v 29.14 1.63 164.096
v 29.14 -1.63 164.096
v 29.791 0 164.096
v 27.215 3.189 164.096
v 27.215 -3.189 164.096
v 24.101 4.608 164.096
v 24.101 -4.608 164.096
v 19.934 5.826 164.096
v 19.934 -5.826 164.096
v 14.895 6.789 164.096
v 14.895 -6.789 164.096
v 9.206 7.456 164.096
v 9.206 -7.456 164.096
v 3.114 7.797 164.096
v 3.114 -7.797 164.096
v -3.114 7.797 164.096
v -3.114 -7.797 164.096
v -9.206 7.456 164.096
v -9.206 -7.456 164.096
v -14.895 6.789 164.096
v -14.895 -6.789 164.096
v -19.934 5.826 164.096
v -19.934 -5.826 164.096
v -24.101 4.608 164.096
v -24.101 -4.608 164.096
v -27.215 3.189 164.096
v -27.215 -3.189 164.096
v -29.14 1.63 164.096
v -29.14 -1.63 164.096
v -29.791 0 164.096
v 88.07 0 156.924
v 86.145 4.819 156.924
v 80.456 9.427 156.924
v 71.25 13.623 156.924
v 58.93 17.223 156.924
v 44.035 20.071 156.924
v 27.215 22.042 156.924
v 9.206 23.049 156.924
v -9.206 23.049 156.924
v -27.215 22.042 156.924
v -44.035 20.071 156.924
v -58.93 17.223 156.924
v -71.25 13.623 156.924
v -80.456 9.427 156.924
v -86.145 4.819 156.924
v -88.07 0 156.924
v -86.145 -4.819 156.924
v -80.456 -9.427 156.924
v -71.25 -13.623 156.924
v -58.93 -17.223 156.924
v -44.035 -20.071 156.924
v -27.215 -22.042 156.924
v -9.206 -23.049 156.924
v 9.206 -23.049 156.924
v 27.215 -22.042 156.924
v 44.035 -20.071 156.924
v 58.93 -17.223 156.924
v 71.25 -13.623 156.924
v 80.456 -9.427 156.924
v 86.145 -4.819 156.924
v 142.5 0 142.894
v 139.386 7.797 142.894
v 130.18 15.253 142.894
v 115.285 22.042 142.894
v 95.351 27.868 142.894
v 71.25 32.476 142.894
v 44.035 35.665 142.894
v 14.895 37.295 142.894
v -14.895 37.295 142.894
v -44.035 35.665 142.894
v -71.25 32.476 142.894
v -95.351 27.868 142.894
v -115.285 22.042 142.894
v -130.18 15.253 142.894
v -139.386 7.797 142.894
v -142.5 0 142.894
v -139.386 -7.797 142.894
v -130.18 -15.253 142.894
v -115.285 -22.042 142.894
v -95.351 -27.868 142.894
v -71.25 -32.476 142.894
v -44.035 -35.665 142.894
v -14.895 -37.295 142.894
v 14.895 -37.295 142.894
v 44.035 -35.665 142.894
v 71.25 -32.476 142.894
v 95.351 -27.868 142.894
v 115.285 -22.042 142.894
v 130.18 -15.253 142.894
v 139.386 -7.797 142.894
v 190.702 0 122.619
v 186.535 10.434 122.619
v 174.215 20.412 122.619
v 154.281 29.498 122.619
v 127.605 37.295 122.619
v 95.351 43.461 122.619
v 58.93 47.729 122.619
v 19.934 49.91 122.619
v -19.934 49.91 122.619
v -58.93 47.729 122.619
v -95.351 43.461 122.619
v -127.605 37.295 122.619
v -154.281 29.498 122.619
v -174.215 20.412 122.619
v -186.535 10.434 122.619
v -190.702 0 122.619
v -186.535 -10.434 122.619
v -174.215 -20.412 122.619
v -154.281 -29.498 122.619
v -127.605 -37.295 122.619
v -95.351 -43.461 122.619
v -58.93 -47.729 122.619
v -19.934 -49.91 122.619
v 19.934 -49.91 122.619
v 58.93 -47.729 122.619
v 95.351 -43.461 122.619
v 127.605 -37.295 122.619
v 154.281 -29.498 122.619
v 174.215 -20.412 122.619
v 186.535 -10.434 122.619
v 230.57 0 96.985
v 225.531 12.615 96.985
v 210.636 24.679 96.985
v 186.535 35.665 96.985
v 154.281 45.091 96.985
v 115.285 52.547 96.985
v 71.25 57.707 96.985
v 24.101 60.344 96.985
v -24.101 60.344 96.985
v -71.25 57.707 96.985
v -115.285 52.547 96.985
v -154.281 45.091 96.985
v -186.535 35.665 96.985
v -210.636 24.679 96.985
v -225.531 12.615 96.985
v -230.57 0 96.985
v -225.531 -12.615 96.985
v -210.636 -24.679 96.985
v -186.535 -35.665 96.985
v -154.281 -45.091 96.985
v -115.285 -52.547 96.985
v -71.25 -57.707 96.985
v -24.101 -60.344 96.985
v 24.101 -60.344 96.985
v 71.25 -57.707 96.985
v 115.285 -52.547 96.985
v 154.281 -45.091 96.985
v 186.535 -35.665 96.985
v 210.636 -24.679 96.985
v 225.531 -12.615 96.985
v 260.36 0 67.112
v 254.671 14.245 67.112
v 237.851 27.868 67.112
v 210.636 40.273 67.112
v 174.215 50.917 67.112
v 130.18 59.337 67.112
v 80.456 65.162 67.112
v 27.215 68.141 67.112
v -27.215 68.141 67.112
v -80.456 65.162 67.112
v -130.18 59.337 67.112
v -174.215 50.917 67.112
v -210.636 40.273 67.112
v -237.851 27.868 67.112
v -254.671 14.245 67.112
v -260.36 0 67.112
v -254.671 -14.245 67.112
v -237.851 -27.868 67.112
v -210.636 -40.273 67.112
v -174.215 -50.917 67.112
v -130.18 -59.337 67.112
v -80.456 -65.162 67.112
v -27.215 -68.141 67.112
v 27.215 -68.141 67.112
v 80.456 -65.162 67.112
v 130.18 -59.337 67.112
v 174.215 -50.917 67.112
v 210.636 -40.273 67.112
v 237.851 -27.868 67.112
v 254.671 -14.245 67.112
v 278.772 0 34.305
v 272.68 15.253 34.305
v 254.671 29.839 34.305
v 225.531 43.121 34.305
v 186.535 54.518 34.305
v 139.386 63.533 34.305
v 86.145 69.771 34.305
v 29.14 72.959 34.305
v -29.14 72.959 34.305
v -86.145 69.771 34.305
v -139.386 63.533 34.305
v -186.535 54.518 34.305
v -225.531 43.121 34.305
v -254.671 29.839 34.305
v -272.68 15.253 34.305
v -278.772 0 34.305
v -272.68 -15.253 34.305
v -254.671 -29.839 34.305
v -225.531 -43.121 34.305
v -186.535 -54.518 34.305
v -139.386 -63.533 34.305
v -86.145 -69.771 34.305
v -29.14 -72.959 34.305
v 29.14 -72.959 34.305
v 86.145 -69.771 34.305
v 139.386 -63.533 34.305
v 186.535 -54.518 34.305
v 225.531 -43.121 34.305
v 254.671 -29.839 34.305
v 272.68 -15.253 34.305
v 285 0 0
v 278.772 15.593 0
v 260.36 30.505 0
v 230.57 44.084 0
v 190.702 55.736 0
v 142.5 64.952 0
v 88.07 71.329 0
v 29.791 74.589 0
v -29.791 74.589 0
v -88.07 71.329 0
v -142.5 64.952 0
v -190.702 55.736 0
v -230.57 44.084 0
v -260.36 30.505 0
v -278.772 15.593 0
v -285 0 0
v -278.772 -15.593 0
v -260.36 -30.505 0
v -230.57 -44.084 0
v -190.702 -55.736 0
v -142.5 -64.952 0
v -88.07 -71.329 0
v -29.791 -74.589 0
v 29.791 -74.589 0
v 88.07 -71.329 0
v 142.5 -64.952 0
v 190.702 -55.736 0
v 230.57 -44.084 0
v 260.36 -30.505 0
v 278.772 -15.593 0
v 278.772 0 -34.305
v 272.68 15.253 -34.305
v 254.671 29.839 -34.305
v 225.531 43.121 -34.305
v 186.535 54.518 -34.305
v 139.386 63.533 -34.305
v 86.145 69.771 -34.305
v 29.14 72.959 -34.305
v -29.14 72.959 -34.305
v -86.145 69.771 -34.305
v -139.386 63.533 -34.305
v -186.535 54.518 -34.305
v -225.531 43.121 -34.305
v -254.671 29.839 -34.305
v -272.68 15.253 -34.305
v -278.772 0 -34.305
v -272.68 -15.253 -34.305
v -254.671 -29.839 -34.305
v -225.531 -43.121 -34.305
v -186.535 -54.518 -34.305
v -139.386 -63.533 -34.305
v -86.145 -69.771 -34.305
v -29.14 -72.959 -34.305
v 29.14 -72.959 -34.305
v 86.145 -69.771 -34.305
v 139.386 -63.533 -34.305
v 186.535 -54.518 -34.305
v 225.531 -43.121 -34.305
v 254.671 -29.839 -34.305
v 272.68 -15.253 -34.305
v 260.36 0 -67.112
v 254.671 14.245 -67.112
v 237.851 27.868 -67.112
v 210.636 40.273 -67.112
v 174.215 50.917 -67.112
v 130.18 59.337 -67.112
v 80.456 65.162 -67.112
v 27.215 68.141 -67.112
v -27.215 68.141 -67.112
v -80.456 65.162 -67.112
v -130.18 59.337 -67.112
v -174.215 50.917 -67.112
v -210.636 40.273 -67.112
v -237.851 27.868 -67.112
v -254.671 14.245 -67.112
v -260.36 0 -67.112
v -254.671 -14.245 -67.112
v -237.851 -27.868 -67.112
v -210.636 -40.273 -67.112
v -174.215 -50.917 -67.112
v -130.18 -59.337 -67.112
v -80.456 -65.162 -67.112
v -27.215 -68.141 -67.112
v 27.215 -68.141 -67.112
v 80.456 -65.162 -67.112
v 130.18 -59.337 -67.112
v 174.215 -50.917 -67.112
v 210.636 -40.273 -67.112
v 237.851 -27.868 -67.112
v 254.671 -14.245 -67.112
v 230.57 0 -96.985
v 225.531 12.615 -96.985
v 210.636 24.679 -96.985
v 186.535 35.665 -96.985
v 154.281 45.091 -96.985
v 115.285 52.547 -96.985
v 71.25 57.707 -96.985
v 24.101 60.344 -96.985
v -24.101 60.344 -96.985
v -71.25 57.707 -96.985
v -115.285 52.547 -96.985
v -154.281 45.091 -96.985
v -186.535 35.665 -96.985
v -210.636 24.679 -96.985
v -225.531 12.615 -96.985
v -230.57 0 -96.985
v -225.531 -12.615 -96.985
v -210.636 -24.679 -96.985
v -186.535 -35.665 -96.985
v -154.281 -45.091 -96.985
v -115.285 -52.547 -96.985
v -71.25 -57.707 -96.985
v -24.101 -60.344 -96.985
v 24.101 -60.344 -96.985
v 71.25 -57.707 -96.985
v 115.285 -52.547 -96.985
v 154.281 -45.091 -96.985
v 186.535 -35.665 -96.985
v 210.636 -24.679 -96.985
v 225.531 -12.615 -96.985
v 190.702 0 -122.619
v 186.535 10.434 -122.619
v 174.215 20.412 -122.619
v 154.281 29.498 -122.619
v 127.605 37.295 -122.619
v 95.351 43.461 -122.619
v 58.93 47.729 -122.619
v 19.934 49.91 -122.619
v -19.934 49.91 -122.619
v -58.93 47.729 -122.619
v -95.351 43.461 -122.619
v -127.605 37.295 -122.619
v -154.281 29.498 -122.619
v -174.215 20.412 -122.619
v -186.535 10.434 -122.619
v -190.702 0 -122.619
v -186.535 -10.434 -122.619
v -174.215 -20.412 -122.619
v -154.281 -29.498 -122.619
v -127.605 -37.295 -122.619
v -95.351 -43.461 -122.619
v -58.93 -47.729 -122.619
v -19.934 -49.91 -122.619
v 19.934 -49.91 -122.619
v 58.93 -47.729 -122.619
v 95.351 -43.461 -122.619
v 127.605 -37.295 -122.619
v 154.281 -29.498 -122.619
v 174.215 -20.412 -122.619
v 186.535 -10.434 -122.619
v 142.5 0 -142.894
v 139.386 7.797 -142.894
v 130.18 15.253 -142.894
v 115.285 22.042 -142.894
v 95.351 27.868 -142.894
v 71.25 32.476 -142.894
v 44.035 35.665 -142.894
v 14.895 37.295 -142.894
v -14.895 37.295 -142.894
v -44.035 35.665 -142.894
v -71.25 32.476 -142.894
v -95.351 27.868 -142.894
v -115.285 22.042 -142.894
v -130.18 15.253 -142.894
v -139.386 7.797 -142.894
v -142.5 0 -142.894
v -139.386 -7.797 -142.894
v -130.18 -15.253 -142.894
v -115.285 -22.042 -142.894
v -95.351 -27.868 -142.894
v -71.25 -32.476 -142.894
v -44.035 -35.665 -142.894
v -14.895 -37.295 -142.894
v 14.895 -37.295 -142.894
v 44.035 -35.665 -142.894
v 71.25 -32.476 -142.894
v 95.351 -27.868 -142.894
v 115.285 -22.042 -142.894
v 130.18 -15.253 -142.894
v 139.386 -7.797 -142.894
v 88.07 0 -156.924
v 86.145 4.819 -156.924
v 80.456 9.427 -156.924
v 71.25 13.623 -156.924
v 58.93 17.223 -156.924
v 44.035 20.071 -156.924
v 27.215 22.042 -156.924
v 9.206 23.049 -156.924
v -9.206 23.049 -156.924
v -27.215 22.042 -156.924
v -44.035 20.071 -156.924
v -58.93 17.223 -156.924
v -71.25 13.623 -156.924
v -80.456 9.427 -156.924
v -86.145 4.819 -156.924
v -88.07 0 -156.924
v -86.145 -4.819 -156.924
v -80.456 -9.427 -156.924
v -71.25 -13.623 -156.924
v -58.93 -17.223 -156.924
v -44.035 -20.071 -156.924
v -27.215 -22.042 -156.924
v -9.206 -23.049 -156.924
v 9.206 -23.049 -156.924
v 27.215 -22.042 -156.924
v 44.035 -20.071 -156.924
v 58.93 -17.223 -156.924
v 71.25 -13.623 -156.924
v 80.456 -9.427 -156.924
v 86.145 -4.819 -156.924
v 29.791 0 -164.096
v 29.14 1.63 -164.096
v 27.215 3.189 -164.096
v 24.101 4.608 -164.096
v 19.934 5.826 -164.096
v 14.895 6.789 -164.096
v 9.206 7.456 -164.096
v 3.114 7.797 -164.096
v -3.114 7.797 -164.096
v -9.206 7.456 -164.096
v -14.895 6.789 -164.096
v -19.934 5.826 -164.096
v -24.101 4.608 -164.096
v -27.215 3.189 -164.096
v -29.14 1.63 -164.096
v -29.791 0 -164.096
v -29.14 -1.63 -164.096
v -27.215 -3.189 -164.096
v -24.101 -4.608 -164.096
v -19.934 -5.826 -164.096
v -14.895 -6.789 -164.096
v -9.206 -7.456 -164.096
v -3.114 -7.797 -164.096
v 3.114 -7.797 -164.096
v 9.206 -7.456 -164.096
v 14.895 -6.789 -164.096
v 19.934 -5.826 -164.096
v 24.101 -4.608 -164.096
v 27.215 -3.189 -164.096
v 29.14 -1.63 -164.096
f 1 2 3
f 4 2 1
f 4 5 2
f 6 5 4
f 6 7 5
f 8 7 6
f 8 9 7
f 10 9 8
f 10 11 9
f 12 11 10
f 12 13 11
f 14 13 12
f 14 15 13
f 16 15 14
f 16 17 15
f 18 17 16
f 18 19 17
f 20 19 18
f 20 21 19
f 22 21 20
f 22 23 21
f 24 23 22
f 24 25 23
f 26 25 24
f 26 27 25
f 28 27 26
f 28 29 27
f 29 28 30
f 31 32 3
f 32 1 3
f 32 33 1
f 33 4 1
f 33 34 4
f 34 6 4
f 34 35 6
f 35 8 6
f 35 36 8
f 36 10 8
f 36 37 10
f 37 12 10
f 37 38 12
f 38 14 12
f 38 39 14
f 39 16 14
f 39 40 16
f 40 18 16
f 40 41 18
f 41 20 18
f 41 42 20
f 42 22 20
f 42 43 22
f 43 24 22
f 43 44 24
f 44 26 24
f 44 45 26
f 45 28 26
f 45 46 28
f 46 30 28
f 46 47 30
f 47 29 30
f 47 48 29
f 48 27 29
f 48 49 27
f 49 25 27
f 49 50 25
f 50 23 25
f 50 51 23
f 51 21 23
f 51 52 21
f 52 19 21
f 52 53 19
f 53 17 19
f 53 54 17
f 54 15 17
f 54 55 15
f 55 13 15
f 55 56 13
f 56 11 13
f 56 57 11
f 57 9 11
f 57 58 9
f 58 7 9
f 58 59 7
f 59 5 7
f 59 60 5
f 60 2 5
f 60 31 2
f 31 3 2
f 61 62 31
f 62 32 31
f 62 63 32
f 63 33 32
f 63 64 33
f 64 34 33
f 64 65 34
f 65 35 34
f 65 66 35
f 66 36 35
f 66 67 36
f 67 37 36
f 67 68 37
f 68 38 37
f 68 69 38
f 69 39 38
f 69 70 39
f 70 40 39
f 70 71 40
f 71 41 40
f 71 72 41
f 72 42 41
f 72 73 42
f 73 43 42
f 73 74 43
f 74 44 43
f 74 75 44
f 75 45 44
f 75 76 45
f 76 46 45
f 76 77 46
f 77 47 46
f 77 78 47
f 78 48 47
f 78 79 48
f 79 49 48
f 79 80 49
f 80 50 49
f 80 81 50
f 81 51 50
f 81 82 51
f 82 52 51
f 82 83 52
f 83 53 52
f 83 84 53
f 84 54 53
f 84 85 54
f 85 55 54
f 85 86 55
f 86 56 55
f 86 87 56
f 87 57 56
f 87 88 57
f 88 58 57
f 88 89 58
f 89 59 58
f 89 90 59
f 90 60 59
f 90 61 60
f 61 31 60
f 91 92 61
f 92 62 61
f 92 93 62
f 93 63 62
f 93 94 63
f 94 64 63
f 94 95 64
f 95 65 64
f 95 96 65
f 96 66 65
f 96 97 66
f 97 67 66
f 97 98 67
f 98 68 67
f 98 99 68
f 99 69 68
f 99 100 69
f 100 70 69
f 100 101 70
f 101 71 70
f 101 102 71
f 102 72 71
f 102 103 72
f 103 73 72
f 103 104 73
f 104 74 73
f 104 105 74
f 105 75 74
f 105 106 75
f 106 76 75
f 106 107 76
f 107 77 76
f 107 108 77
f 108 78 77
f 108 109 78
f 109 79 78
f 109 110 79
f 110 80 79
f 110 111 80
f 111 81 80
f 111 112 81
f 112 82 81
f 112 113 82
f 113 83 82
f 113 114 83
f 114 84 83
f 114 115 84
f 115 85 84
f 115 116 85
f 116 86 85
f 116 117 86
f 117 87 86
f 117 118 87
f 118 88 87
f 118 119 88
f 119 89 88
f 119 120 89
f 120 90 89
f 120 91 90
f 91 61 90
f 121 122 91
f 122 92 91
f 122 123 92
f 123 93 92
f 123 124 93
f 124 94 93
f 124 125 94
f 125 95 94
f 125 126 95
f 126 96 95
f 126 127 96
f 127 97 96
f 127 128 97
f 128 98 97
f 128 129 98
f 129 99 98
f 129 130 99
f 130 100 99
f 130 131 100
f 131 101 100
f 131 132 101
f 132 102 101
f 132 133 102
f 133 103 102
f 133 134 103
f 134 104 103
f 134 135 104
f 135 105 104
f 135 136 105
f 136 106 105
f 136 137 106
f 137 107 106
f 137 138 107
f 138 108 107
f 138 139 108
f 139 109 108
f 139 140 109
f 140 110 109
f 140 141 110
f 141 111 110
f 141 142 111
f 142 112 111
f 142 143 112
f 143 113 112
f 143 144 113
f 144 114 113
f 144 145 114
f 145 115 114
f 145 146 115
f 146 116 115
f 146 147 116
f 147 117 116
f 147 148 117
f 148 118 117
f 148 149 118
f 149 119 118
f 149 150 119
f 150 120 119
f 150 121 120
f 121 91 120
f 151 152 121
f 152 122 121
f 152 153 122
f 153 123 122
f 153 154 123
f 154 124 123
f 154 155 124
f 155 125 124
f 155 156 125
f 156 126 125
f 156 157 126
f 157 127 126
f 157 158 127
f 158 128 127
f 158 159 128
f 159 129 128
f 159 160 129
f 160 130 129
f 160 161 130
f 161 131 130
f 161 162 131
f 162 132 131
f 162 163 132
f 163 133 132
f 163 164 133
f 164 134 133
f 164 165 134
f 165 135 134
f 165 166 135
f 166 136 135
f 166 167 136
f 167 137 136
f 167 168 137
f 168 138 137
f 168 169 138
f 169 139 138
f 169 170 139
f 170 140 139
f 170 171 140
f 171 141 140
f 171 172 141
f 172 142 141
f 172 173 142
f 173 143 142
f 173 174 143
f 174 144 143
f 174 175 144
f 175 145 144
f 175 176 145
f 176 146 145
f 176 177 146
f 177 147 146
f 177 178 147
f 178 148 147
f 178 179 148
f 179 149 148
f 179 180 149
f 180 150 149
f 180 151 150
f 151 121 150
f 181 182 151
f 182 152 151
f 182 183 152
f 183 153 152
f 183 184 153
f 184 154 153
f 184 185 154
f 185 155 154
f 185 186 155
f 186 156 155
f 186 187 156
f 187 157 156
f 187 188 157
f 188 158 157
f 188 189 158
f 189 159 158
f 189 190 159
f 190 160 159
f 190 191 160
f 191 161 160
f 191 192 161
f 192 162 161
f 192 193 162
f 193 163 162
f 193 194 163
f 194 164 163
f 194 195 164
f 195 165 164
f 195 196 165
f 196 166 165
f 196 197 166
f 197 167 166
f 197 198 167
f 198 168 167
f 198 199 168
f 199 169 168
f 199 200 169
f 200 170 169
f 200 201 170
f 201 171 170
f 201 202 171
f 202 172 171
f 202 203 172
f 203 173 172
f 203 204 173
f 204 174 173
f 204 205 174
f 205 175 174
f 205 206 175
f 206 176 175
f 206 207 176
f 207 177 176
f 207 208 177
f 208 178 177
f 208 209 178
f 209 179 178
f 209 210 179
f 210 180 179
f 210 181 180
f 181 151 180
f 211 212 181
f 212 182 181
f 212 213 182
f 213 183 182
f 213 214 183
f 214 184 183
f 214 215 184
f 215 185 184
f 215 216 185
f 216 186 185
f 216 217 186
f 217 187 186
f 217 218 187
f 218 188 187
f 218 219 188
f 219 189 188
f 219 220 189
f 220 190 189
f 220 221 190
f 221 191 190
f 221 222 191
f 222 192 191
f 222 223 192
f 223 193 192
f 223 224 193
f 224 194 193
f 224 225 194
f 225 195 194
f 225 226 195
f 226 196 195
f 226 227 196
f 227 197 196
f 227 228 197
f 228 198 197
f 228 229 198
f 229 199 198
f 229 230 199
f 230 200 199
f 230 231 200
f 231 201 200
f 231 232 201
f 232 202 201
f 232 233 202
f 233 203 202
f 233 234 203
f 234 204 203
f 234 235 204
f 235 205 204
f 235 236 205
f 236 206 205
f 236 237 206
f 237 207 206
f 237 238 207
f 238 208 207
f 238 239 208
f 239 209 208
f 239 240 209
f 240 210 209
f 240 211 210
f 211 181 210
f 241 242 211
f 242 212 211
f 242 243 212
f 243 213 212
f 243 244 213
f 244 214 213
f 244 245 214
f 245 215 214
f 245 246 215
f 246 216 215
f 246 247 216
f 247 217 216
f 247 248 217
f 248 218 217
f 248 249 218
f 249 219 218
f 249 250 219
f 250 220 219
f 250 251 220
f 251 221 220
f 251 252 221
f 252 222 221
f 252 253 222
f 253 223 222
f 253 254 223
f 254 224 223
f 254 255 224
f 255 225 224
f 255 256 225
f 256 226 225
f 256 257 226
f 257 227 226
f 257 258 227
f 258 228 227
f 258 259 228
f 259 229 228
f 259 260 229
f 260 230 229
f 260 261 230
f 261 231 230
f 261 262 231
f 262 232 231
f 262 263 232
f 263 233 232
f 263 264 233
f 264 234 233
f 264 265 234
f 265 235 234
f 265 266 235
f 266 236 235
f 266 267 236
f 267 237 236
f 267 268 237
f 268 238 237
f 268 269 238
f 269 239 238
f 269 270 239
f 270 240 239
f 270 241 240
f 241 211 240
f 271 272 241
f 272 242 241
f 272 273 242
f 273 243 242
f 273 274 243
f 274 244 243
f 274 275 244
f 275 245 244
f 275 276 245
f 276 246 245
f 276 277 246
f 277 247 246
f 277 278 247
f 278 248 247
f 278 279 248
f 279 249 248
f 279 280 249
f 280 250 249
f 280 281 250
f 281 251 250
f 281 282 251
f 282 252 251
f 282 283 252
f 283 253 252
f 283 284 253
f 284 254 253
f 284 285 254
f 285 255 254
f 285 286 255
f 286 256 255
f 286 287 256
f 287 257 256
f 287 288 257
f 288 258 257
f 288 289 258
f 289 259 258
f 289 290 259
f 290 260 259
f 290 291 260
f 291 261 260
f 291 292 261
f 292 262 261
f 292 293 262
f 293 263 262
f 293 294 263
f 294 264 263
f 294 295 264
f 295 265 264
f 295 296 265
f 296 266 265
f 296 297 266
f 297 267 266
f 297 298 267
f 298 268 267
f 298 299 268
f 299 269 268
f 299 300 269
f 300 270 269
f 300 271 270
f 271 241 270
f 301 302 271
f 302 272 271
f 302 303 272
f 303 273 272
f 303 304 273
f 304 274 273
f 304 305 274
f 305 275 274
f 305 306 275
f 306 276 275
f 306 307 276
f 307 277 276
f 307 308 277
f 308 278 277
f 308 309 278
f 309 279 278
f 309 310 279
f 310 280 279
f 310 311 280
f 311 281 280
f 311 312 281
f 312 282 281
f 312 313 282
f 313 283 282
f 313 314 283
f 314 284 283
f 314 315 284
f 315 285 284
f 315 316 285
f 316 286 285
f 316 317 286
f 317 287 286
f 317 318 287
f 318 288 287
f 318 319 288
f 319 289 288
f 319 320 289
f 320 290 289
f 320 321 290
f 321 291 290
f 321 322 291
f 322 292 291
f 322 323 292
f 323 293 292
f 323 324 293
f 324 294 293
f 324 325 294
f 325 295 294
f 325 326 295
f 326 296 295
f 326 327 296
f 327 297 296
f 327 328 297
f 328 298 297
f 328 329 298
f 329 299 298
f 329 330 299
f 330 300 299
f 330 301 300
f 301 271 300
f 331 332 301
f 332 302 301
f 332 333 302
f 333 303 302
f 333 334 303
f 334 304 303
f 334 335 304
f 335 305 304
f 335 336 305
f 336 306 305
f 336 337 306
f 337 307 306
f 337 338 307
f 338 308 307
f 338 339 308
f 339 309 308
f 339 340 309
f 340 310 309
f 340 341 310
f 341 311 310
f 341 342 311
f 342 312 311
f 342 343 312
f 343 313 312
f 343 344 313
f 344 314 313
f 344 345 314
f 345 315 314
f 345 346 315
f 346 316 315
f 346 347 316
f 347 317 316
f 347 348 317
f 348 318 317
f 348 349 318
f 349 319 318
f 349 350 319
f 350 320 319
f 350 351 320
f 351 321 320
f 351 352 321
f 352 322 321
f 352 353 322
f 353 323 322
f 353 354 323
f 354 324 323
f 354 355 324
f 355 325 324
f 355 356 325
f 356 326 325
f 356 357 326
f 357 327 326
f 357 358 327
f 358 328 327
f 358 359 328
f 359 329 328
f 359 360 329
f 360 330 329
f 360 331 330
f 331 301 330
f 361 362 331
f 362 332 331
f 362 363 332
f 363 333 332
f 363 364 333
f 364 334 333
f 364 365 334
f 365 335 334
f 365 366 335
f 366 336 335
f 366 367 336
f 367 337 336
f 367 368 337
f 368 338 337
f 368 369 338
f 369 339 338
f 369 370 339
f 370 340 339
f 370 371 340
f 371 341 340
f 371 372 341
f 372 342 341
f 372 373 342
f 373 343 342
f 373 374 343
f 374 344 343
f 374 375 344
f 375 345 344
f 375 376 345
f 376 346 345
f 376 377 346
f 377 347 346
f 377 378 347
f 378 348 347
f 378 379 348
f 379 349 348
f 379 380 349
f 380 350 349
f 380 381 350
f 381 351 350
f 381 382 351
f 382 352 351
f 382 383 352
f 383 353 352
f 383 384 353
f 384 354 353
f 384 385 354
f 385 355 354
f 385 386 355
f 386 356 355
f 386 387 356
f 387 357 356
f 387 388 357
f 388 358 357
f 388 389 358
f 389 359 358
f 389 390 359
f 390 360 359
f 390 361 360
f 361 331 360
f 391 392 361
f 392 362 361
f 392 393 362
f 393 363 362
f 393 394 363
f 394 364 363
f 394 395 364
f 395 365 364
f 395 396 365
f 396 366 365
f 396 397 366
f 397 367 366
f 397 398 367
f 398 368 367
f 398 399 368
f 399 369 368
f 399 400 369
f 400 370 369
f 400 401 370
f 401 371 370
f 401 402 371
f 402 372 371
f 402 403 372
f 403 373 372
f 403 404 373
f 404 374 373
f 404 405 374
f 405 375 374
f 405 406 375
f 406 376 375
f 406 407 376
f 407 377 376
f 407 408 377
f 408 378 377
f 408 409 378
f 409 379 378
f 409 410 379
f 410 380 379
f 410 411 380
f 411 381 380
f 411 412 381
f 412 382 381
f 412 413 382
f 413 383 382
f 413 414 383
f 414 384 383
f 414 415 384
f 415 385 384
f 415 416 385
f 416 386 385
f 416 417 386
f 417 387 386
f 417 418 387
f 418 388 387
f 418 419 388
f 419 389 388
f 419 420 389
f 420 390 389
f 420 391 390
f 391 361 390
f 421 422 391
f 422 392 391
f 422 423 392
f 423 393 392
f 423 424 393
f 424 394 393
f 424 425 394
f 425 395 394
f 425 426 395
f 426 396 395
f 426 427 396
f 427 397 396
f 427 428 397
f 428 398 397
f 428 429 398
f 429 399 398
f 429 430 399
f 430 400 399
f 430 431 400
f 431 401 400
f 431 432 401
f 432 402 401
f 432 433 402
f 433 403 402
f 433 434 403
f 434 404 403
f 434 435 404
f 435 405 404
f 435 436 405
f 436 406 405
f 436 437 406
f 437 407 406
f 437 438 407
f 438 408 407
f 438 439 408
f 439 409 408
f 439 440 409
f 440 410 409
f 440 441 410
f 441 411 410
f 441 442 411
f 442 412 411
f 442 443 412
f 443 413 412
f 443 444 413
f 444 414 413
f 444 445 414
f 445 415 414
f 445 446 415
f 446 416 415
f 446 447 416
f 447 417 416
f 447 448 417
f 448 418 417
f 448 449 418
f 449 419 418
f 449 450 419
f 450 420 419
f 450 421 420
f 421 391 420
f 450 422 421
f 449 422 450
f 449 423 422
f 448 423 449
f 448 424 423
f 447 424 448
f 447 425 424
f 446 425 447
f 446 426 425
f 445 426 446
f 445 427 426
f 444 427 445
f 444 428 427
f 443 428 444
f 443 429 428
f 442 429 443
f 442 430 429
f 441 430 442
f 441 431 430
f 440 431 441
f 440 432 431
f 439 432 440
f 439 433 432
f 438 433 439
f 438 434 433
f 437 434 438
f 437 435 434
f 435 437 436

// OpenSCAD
// Generated by SolidPython 1.0.1 on 2020-07-29 00:46:53


scale(v = [19, 5, 11]) {
	sphere(r = 15);
}
/***********************************************
*********      SolidPython code:      **********
************************************************
 
# import packages: SolidPython
from solid import *
from solid.utils import *
from itertools import chain, combinations, permutations


class Resize:

    def __init__(self, scad_file):
        self.scad_file = scad_file
        #self.scad_file = import_scad(scad_file)
        # cone/cylinder param:
        self.r1 = 0
        self.r2 = 0
        self.h = 0
        # rectangular prism param:
        self.w = 0
        self.l = 0
        # ellipse param:
        self.r = 0

    # import OpenScad code (file name corresponds to shape)


    # classify shape + parameters
    def assign(self, param1, param2, param3):
        if self.scad_file == 'cone.scad':
            self.r1 = param1
            self.r2 = param2
            self.h = param3
        elif self.scad_file == 'cylinder.scad':
            self.r1 = param1
            self.r2 = param2
            self.h = param3
        elif self.scad_file == 'rectangularPrism.scad':
            self.h = param1
            self.l = param2
            self.w = param3
        else:
            self.r = param1
            self.h = param2

    # resize parameters
    def iterate(self):
        x = range(3, 20, 2)
        i = 1
        if self.scad_file == 'cone.scad':
            tempList = list(permutations(x, 2))
            for temp in tempList:
                param1 = temp[0]
                param2 = temp[1]
                filepath = 'produced_scad_files/' + 'cone' + str(param1) + '_' + str(param2) + '_' + '.scad'
                scad_render_to_file(cylinder(h=param1, r1=param2, r2=0), filepath)

        elif self.scad_file == 'cylinder.scad':
            tempList = list(permutations(x, 3))
            for temp in tempList:
                param1 = temp[0]
                param2 = temp[1]
                filepath = 'produced_scad_files/' + 'cylinder' + str(param1) + '_' + str(param2) + '_' + '.scad'
                scad_render_to_file(cylinder(h=param1, r1=param2, r2=param2), filepath)

        elif self.scad_file == 'rectangularPrism.scad':
            tempList = list(permutations(x, 3))
            for temp in tempList:
                param1 = temp[0]
                param2 = temp[1]
                param3 = temp[2]
                filepath = 'produced_scad_files/' + 'rectangularPrism' + str(param1) + '_' + str(param2) + '_' + str(
                    param3) + '.scad'
                scad_render_to_file(cube(size=(param1, param2, param3)), filepath)

        elif self.scad_file == 'ellipse.scad':
            tempList = list(permutations(x, 4))
            for temp in tempList:
                param1 = temp[0]
                param2 = temp[1]
                param3 = temp[2]
                param4 = temp[3]
                filepath = 'produced_scad_files/' + 'ellipse' + str(param1) + '_' + str(param2) + '_' + str(param3) + '_' + str(param4) + '.scad'
                scad_render_to_file(scale([param1, param2, param3])(sphere(r=param4)), filepath)

    def render_to_scadfile(self):
        scad_render_to_file(scad, 'example.scad') 
 
************************************************/
